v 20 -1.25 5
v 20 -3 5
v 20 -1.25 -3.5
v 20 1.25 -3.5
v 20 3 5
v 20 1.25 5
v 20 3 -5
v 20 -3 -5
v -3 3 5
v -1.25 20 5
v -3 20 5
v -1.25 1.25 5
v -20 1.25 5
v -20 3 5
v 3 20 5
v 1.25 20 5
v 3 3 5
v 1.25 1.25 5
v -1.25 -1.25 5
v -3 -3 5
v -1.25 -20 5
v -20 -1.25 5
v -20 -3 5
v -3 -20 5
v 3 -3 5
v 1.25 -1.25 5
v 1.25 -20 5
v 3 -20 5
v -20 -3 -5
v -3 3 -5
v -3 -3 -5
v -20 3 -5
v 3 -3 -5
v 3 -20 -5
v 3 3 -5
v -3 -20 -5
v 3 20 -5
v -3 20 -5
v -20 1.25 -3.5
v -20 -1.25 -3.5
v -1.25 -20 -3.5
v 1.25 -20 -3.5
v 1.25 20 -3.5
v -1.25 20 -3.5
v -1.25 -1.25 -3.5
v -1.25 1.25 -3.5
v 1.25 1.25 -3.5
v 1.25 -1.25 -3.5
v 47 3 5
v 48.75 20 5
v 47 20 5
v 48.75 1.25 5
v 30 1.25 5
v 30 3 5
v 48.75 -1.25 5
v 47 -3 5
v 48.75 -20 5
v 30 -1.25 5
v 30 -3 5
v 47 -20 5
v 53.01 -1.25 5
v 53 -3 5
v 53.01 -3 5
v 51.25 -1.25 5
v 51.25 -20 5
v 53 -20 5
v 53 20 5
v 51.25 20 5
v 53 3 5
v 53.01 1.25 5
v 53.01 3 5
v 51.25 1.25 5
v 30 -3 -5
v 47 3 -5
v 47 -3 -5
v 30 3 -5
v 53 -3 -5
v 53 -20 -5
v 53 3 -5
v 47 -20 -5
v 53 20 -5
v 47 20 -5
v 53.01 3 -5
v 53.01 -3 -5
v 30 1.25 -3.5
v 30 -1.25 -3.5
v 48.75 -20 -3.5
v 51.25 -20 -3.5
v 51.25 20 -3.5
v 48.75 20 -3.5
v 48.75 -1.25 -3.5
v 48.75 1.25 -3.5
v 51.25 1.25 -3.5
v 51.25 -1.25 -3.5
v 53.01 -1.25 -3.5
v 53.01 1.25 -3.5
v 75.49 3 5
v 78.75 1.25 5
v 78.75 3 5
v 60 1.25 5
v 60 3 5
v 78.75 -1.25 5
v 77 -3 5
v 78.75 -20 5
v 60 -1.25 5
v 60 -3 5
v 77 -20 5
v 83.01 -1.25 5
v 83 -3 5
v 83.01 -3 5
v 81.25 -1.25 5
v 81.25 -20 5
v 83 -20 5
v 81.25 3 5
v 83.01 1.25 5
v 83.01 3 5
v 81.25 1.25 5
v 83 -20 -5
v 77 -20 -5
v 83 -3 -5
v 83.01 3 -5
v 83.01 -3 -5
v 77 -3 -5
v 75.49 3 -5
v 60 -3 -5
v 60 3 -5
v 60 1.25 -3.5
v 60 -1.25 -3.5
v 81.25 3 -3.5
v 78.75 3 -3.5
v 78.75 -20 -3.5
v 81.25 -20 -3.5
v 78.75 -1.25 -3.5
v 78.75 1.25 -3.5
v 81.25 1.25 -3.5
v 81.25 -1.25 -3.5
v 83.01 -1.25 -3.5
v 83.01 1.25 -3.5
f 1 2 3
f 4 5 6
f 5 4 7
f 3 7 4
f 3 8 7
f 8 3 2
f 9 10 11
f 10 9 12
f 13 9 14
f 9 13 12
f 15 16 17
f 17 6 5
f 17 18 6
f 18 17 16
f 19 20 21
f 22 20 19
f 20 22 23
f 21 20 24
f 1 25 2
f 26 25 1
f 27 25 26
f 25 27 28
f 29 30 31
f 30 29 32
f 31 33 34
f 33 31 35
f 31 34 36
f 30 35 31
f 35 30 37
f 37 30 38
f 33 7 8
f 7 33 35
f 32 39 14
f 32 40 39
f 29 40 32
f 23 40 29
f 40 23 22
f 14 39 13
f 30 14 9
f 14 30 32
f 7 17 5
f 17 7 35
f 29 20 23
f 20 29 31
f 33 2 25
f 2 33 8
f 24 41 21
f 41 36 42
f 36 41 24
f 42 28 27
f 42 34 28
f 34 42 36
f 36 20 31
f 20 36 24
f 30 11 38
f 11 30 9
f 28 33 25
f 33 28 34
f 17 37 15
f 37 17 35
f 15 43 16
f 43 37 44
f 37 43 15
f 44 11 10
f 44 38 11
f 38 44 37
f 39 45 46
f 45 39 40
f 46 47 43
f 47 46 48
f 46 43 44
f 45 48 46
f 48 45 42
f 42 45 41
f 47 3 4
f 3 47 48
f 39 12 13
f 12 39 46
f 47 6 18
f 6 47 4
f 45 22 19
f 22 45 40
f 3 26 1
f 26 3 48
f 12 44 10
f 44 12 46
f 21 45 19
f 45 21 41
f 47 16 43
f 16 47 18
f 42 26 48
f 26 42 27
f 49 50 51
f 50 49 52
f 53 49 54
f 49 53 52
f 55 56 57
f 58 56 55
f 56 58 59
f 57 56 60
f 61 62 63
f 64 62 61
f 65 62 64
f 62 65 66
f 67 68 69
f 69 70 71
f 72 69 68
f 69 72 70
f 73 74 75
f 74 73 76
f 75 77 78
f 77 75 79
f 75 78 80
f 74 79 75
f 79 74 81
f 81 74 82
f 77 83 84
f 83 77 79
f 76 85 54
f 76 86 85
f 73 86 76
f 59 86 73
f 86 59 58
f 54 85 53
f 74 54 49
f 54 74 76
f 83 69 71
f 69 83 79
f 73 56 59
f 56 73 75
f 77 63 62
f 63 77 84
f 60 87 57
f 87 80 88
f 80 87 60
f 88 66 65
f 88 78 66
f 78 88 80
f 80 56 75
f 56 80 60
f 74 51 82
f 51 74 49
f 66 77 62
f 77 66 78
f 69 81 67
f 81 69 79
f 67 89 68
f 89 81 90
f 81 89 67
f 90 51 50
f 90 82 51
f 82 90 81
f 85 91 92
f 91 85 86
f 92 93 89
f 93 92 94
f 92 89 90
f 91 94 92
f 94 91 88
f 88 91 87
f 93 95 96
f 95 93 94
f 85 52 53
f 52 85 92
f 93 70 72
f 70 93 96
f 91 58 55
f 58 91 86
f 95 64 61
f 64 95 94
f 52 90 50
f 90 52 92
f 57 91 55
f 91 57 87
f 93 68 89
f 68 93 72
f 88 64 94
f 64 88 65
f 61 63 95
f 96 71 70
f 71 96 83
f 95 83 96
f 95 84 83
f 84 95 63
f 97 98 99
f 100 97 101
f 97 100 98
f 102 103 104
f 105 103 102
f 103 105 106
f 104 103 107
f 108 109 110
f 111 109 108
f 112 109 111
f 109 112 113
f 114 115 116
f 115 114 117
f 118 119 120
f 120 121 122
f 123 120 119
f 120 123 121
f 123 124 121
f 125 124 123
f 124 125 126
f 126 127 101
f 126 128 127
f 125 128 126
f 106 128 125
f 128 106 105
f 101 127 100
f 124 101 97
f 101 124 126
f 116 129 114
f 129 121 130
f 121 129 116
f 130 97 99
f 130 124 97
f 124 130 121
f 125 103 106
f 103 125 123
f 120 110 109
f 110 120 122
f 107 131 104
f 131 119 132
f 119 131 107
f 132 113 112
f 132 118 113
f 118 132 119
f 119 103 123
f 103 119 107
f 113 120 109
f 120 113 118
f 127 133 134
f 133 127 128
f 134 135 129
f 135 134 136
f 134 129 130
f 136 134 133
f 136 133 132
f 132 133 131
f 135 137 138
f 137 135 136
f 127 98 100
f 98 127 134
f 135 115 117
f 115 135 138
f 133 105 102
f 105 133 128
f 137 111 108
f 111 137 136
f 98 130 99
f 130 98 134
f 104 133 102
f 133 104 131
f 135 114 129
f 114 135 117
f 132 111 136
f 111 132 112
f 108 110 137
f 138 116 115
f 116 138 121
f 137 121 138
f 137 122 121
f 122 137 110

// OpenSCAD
wall_thickness = 1.5; // of walls
wood_thickness = 2;
smidge = .01;
spacing = 50;

length = 40;
width = 6;
height = 10;

gap_length = length + wall_thickness;
gap_width = wood_thickness + 0.5;
gap_height = height;

module gap(rotation) {
  rotate(rotation) {
    translate([0, 0, wall_thickness]) {
      cube([gap_length, gap_width, gap_height], center = true);
    }
  }
}

module segment(rotation) {
  rotate(rotation) {
    cube([length, width, height], center = true);
    }
  }

module gaps() {
  union() {
    gap(0);
    gap(90);
    }
  }

module segments() {
  union() {
    segment(0);
    segment(90);
    }
  }

module x_bracket() {
  difference() {
    segments();
    gaps();
    }
  }

module t_bracket() {
  difference() {
    x_bracket();
    translate([width/2 + smidge, -width, -height]) {
      cube([length, length, length]);
      }
    }
  }

module corner() {
  translate([gap_width/2 - smidge, gap_width/2 - smidge, -(height/2 - wall_thickness)]) {
    cube([wall_thickness + 1, wall_thickness + 1, height + 1]);
    }
  }

module l_bracket() {
  difference() {
    t_bracket(); 
    union() {
      translate([-width/2 - wall_thickness - smidge, width/2, - height + wall_thickness]) {
        cube([length, length, length]);
      }    
      %corner();
      }
    }
  }

x_bracket();

translate([50, 0, 0]) {
  t_bracket();
  }

translate([80, 0, 0]) {
  l_bracket();
  }
